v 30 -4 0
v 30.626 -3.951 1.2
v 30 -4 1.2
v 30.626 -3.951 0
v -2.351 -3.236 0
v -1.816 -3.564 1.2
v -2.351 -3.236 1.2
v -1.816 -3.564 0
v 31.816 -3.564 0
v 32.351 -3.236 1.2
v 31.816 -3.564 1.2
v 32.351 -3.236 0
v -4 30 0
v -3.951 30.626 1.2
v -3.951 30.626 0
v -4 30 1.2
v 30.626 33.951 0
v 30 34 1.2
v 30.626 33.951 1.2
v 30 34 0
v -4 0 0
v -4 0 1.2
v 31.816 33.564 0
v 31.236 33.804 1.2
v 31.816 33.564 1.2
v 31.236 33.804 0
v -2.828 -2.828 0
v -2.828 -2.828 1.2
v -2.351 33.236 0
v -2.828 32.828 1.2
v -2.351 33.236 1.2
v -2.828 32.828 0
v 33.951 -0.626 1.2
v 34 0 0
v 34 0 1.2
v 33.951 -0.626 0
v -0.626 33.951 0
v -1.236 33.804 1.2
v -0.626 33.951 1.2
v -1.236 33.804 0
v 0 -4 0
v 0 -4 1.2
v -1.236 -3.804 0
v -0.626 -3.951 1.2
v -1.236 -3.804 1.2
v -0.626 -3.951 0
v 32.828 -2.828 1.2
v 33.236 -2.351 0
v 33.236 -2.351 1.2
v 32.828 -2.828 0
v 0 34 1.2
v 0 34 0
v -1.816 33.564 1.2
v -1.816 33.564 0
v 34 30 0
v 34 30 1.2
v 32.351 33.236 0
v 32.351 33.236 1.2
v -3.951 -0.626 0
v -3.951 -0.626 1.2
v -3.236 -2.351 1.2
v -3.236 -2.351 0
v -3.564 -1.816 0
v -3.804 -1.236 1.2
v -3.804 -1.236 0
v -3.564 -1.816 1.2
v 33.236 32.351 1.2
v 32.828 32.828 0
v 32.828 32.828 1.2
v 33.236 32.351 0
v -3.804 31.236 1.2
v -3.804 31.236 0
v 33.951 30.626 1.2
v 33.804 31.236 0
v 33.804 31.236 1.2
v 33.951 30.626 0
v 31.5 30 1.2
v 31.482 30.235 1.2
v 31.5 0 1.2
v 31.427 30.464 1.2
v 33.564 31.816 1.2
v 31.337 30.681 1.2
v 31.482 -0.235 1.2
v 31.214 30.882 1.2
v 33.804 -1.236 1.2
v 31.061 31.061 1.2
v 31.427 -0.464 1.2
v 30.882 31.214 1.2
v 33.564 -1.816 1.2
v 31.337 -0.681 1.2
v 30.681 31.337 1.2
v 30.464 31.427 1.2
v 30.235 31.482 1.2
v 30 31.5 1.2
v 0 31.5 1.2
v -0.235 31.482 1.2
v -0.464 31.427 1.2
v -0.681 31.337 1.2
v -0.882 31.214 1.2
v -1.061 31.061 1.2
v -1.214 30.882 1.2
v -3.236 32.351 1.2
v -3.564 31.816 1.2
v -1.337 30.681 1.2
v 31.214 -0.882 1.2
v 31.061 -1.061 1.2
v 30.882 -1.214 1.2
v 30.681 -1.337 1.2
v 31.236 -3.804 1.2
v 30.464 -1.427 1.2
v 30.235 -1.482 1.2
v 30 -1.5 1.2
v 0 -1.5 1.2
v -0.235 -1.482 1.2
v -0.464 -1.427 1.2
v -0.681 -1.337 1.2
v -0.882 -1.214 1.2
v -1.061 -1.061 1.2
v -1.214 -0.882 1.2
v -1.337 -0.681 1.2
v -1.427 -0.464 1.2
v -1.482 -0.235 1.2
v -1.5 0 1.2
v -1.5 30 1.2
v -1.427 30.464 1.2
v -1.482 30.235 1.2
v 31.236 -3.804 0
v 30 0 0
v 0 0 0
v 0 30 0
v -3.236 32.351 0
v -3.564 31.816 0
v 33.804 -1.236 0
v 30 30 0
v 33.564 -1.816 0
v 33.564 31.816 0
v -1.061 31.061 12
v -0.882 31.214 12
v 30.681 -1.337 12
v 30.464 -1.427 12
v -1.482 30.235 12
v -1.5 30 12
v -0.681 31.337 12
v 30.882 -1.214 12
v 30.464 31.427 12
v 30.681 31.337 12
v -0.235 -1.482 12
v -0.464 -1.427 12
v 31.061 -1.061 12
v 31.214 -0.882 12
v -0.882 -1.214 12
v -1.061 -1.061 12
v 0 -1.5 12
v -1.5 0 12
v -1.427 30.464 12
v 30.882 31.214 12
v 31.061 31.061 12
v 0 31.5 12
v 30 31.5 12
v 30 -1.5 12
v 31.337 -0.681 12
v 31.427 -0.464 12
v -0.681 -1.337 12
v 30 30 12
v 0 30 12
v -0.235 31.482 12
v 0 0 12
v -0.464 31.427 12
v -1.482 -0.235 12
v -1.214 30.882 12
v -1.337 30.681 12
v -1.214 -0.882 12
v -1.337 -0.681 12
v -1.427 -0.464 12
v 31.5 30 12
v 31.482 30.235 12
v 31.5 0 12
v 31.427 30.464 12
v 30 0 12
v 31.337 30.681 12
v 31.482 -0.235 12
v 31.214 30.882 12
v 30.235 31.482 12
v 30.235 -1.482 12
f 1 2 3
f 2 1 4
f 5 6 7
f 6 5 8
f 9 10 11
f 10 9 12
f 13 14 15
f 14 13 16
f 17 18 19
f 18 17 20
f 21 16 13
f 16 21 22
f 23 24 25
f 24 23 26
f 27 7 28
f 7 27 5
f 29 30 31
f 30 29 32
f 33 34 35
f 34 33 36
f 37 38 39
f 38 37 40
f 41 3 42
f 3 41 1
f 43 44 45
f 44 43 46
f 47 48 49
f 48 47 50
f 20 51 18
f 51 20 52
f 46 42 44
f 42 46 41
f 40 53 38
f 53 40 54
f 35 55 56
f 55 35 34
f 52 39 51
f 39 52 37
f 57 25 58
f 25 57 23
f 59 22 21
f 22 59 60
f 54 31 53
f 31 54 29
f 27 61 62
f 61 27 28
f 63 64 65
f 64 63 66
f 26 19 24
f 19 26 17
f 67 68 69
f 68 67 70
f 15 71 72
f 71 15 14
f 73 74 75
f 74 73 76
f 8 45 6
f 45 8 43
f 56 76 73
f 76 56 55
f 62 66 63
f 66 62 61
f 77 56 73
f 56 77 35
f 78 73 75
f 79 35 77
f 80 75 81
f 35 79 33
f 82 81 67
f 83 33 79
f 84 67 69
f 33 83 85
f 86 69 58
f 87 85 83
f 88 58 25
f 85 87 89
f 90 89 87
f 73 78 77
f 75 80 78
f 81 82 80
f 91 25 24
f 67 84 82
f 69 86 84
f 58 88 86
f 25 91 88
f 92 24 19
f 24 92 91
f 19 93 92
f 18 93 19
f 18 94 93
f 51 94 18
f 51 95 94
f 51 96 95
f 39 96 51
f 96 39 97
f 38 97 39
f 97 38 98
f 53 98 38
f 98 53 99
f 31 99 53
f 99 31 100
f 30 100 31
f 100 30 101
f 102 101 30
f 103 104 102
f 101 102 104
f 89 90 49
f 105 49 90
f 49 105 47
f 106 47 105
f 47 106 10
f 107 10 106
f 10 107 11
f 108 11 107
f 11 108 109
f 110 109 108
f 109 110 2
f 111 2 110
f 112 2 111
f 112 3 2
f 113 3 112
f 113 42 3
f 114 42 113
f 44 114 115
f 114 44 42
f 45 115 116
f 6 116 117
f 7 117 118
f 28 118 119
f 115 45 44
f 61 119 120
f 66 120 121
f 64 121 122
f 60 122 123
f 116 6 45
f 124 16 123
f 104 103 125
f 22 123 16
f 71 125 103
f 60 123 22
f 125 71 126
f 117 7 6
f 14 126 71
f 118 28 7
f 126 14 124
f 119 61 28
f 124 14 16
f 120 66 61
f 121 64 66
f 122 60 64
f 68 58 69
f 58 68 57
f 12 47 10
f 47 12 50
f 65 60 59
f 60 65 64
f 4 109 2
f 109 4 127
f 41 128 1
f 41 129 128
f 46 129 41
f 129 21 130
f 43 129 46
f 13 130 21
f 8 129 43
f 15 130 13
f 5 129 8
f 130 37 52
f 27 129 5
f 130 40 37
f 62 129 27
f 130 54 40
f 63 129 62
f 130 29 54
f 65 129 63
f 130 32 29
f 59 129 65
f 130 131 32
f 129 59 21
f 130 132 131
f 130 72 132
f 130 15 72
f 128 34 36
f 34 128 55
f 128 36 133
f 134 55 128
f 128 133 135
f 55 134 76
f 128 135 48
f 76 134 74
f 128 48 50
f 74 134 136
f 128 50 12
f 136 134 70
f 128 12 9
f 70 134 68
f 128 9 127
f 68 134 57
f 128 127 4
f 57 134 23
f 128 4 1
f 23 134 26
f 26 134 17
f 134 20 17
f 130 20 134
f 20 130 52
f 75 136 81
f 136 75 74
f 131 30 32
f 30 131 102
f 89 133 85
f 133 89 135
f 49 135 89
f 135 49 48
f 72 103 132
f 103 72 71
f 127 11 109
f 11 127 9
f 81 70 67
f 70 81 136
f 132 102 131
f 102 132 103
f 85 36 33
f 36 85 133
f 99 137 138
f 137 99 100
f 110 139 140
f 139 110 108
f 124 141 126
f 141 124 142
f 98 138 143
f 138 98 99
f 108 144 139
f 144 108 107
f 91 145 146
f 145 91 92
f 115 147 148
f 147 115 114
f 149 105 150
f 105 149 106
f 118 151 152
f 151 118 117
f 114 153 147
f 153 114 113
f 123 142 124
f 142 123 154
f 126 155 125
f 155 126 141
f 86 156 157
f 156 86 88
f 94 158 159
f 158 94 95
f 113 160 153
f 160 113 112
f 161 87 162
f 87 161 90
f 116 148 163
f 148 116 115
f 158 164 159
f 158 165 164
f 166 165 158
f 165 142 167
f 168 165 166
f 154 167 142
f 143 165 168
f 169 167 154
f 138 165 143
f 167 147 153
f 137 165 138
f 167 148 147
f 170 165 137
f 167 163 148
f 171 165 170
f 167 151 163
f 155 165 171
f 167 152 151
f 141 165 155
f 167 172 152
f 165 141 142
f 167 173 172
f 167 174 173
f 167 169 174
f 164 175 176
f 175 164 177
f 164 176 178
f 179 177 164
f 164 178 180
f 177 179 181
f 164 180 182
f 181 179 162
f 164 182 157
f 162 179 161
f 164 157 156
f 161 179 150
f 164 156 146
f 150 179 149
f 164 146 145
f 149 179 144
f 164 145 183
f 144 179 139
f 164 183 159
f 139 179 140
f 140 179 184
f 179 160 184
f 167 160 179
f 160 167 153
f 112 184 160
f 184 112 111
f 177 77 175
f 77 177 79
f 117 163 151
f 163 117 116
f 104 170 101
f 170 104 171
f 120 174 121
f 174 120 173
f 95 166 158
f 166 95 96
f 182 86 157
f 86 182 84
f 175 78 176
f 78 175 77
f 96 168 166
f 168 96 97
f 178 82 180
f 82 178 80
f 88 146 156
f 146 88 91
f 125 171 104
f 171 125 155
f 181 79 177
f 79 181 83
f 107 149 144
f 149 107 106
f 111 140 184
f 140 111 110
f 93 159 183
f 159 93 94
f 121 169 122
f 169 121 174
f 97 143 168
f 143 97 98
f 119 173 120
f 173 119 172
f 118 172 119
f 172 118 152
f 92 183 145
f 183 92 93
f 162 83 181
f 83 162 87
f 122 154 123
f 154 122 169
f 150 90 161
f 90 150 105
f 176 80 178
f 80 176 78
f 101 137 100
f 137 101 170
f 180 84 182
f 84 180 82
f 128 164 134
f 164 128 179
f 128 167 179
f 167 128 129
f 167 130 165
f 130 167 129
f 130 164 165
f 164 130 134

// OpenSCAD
poly = [[[-1,1],[1,1],[1,-1],[-1,-1]],[[0,1,2,3]]]; //[draw_polygon:100x100]

//Cutter size (mm)
size = 30;
//Round edges of cutter?
rounded = "true"; // [false,true]
Brounded = (rounded == "true");
//width of cookie cutter body (mm)
width = 1.5;
//total height of the cookie cutter (mm)
height = 12.0;
//width of bottom flange (mm)
flangeWidth = 4.0;
//height of bottom border (mm)
flangeHeight = 1.2;
//arc segments/precision
$fn = 40; // [1:100]

function bounds(pts) =
    let (xs = [ for (i=[0:len(pts)-1]) pts[i][0] ], ys = [ for (i=[0:len(pts)-1]) pts[i][1] ])
	[ [min(xs), min(ys)], [max(xs), max(ys)] ];

module shape() {
	b = bounds(poly[0]);
	h = b[1][1] - b[0][1];
	w = b[1][0] - b[0][0];
	scale([size/max(h,w),size/max(h,w),1])
	translate([-b[0][0], -b[0][1]])
	polygon(poly[0], poly[1]);
}

difference(){
    if (Brounded) { //which offset style to use?
        linear_extrude(flangeHeight) offset(flangeWidth) shape(); //flange on top
        linear_extrude(height) offset(width) shape();             //outer edge of cutter
    } else {
        linear_extrude(flangeHeight) offset(delta=flangeWidth) shape(); //flange on top
        linear_extrude(height) offset(delta=width) shape();             //outer edge of cutter
    }
    translate([0,0,-0.1]) linear_extrude(height+0.2) shape(); //offset to subtract well
}
